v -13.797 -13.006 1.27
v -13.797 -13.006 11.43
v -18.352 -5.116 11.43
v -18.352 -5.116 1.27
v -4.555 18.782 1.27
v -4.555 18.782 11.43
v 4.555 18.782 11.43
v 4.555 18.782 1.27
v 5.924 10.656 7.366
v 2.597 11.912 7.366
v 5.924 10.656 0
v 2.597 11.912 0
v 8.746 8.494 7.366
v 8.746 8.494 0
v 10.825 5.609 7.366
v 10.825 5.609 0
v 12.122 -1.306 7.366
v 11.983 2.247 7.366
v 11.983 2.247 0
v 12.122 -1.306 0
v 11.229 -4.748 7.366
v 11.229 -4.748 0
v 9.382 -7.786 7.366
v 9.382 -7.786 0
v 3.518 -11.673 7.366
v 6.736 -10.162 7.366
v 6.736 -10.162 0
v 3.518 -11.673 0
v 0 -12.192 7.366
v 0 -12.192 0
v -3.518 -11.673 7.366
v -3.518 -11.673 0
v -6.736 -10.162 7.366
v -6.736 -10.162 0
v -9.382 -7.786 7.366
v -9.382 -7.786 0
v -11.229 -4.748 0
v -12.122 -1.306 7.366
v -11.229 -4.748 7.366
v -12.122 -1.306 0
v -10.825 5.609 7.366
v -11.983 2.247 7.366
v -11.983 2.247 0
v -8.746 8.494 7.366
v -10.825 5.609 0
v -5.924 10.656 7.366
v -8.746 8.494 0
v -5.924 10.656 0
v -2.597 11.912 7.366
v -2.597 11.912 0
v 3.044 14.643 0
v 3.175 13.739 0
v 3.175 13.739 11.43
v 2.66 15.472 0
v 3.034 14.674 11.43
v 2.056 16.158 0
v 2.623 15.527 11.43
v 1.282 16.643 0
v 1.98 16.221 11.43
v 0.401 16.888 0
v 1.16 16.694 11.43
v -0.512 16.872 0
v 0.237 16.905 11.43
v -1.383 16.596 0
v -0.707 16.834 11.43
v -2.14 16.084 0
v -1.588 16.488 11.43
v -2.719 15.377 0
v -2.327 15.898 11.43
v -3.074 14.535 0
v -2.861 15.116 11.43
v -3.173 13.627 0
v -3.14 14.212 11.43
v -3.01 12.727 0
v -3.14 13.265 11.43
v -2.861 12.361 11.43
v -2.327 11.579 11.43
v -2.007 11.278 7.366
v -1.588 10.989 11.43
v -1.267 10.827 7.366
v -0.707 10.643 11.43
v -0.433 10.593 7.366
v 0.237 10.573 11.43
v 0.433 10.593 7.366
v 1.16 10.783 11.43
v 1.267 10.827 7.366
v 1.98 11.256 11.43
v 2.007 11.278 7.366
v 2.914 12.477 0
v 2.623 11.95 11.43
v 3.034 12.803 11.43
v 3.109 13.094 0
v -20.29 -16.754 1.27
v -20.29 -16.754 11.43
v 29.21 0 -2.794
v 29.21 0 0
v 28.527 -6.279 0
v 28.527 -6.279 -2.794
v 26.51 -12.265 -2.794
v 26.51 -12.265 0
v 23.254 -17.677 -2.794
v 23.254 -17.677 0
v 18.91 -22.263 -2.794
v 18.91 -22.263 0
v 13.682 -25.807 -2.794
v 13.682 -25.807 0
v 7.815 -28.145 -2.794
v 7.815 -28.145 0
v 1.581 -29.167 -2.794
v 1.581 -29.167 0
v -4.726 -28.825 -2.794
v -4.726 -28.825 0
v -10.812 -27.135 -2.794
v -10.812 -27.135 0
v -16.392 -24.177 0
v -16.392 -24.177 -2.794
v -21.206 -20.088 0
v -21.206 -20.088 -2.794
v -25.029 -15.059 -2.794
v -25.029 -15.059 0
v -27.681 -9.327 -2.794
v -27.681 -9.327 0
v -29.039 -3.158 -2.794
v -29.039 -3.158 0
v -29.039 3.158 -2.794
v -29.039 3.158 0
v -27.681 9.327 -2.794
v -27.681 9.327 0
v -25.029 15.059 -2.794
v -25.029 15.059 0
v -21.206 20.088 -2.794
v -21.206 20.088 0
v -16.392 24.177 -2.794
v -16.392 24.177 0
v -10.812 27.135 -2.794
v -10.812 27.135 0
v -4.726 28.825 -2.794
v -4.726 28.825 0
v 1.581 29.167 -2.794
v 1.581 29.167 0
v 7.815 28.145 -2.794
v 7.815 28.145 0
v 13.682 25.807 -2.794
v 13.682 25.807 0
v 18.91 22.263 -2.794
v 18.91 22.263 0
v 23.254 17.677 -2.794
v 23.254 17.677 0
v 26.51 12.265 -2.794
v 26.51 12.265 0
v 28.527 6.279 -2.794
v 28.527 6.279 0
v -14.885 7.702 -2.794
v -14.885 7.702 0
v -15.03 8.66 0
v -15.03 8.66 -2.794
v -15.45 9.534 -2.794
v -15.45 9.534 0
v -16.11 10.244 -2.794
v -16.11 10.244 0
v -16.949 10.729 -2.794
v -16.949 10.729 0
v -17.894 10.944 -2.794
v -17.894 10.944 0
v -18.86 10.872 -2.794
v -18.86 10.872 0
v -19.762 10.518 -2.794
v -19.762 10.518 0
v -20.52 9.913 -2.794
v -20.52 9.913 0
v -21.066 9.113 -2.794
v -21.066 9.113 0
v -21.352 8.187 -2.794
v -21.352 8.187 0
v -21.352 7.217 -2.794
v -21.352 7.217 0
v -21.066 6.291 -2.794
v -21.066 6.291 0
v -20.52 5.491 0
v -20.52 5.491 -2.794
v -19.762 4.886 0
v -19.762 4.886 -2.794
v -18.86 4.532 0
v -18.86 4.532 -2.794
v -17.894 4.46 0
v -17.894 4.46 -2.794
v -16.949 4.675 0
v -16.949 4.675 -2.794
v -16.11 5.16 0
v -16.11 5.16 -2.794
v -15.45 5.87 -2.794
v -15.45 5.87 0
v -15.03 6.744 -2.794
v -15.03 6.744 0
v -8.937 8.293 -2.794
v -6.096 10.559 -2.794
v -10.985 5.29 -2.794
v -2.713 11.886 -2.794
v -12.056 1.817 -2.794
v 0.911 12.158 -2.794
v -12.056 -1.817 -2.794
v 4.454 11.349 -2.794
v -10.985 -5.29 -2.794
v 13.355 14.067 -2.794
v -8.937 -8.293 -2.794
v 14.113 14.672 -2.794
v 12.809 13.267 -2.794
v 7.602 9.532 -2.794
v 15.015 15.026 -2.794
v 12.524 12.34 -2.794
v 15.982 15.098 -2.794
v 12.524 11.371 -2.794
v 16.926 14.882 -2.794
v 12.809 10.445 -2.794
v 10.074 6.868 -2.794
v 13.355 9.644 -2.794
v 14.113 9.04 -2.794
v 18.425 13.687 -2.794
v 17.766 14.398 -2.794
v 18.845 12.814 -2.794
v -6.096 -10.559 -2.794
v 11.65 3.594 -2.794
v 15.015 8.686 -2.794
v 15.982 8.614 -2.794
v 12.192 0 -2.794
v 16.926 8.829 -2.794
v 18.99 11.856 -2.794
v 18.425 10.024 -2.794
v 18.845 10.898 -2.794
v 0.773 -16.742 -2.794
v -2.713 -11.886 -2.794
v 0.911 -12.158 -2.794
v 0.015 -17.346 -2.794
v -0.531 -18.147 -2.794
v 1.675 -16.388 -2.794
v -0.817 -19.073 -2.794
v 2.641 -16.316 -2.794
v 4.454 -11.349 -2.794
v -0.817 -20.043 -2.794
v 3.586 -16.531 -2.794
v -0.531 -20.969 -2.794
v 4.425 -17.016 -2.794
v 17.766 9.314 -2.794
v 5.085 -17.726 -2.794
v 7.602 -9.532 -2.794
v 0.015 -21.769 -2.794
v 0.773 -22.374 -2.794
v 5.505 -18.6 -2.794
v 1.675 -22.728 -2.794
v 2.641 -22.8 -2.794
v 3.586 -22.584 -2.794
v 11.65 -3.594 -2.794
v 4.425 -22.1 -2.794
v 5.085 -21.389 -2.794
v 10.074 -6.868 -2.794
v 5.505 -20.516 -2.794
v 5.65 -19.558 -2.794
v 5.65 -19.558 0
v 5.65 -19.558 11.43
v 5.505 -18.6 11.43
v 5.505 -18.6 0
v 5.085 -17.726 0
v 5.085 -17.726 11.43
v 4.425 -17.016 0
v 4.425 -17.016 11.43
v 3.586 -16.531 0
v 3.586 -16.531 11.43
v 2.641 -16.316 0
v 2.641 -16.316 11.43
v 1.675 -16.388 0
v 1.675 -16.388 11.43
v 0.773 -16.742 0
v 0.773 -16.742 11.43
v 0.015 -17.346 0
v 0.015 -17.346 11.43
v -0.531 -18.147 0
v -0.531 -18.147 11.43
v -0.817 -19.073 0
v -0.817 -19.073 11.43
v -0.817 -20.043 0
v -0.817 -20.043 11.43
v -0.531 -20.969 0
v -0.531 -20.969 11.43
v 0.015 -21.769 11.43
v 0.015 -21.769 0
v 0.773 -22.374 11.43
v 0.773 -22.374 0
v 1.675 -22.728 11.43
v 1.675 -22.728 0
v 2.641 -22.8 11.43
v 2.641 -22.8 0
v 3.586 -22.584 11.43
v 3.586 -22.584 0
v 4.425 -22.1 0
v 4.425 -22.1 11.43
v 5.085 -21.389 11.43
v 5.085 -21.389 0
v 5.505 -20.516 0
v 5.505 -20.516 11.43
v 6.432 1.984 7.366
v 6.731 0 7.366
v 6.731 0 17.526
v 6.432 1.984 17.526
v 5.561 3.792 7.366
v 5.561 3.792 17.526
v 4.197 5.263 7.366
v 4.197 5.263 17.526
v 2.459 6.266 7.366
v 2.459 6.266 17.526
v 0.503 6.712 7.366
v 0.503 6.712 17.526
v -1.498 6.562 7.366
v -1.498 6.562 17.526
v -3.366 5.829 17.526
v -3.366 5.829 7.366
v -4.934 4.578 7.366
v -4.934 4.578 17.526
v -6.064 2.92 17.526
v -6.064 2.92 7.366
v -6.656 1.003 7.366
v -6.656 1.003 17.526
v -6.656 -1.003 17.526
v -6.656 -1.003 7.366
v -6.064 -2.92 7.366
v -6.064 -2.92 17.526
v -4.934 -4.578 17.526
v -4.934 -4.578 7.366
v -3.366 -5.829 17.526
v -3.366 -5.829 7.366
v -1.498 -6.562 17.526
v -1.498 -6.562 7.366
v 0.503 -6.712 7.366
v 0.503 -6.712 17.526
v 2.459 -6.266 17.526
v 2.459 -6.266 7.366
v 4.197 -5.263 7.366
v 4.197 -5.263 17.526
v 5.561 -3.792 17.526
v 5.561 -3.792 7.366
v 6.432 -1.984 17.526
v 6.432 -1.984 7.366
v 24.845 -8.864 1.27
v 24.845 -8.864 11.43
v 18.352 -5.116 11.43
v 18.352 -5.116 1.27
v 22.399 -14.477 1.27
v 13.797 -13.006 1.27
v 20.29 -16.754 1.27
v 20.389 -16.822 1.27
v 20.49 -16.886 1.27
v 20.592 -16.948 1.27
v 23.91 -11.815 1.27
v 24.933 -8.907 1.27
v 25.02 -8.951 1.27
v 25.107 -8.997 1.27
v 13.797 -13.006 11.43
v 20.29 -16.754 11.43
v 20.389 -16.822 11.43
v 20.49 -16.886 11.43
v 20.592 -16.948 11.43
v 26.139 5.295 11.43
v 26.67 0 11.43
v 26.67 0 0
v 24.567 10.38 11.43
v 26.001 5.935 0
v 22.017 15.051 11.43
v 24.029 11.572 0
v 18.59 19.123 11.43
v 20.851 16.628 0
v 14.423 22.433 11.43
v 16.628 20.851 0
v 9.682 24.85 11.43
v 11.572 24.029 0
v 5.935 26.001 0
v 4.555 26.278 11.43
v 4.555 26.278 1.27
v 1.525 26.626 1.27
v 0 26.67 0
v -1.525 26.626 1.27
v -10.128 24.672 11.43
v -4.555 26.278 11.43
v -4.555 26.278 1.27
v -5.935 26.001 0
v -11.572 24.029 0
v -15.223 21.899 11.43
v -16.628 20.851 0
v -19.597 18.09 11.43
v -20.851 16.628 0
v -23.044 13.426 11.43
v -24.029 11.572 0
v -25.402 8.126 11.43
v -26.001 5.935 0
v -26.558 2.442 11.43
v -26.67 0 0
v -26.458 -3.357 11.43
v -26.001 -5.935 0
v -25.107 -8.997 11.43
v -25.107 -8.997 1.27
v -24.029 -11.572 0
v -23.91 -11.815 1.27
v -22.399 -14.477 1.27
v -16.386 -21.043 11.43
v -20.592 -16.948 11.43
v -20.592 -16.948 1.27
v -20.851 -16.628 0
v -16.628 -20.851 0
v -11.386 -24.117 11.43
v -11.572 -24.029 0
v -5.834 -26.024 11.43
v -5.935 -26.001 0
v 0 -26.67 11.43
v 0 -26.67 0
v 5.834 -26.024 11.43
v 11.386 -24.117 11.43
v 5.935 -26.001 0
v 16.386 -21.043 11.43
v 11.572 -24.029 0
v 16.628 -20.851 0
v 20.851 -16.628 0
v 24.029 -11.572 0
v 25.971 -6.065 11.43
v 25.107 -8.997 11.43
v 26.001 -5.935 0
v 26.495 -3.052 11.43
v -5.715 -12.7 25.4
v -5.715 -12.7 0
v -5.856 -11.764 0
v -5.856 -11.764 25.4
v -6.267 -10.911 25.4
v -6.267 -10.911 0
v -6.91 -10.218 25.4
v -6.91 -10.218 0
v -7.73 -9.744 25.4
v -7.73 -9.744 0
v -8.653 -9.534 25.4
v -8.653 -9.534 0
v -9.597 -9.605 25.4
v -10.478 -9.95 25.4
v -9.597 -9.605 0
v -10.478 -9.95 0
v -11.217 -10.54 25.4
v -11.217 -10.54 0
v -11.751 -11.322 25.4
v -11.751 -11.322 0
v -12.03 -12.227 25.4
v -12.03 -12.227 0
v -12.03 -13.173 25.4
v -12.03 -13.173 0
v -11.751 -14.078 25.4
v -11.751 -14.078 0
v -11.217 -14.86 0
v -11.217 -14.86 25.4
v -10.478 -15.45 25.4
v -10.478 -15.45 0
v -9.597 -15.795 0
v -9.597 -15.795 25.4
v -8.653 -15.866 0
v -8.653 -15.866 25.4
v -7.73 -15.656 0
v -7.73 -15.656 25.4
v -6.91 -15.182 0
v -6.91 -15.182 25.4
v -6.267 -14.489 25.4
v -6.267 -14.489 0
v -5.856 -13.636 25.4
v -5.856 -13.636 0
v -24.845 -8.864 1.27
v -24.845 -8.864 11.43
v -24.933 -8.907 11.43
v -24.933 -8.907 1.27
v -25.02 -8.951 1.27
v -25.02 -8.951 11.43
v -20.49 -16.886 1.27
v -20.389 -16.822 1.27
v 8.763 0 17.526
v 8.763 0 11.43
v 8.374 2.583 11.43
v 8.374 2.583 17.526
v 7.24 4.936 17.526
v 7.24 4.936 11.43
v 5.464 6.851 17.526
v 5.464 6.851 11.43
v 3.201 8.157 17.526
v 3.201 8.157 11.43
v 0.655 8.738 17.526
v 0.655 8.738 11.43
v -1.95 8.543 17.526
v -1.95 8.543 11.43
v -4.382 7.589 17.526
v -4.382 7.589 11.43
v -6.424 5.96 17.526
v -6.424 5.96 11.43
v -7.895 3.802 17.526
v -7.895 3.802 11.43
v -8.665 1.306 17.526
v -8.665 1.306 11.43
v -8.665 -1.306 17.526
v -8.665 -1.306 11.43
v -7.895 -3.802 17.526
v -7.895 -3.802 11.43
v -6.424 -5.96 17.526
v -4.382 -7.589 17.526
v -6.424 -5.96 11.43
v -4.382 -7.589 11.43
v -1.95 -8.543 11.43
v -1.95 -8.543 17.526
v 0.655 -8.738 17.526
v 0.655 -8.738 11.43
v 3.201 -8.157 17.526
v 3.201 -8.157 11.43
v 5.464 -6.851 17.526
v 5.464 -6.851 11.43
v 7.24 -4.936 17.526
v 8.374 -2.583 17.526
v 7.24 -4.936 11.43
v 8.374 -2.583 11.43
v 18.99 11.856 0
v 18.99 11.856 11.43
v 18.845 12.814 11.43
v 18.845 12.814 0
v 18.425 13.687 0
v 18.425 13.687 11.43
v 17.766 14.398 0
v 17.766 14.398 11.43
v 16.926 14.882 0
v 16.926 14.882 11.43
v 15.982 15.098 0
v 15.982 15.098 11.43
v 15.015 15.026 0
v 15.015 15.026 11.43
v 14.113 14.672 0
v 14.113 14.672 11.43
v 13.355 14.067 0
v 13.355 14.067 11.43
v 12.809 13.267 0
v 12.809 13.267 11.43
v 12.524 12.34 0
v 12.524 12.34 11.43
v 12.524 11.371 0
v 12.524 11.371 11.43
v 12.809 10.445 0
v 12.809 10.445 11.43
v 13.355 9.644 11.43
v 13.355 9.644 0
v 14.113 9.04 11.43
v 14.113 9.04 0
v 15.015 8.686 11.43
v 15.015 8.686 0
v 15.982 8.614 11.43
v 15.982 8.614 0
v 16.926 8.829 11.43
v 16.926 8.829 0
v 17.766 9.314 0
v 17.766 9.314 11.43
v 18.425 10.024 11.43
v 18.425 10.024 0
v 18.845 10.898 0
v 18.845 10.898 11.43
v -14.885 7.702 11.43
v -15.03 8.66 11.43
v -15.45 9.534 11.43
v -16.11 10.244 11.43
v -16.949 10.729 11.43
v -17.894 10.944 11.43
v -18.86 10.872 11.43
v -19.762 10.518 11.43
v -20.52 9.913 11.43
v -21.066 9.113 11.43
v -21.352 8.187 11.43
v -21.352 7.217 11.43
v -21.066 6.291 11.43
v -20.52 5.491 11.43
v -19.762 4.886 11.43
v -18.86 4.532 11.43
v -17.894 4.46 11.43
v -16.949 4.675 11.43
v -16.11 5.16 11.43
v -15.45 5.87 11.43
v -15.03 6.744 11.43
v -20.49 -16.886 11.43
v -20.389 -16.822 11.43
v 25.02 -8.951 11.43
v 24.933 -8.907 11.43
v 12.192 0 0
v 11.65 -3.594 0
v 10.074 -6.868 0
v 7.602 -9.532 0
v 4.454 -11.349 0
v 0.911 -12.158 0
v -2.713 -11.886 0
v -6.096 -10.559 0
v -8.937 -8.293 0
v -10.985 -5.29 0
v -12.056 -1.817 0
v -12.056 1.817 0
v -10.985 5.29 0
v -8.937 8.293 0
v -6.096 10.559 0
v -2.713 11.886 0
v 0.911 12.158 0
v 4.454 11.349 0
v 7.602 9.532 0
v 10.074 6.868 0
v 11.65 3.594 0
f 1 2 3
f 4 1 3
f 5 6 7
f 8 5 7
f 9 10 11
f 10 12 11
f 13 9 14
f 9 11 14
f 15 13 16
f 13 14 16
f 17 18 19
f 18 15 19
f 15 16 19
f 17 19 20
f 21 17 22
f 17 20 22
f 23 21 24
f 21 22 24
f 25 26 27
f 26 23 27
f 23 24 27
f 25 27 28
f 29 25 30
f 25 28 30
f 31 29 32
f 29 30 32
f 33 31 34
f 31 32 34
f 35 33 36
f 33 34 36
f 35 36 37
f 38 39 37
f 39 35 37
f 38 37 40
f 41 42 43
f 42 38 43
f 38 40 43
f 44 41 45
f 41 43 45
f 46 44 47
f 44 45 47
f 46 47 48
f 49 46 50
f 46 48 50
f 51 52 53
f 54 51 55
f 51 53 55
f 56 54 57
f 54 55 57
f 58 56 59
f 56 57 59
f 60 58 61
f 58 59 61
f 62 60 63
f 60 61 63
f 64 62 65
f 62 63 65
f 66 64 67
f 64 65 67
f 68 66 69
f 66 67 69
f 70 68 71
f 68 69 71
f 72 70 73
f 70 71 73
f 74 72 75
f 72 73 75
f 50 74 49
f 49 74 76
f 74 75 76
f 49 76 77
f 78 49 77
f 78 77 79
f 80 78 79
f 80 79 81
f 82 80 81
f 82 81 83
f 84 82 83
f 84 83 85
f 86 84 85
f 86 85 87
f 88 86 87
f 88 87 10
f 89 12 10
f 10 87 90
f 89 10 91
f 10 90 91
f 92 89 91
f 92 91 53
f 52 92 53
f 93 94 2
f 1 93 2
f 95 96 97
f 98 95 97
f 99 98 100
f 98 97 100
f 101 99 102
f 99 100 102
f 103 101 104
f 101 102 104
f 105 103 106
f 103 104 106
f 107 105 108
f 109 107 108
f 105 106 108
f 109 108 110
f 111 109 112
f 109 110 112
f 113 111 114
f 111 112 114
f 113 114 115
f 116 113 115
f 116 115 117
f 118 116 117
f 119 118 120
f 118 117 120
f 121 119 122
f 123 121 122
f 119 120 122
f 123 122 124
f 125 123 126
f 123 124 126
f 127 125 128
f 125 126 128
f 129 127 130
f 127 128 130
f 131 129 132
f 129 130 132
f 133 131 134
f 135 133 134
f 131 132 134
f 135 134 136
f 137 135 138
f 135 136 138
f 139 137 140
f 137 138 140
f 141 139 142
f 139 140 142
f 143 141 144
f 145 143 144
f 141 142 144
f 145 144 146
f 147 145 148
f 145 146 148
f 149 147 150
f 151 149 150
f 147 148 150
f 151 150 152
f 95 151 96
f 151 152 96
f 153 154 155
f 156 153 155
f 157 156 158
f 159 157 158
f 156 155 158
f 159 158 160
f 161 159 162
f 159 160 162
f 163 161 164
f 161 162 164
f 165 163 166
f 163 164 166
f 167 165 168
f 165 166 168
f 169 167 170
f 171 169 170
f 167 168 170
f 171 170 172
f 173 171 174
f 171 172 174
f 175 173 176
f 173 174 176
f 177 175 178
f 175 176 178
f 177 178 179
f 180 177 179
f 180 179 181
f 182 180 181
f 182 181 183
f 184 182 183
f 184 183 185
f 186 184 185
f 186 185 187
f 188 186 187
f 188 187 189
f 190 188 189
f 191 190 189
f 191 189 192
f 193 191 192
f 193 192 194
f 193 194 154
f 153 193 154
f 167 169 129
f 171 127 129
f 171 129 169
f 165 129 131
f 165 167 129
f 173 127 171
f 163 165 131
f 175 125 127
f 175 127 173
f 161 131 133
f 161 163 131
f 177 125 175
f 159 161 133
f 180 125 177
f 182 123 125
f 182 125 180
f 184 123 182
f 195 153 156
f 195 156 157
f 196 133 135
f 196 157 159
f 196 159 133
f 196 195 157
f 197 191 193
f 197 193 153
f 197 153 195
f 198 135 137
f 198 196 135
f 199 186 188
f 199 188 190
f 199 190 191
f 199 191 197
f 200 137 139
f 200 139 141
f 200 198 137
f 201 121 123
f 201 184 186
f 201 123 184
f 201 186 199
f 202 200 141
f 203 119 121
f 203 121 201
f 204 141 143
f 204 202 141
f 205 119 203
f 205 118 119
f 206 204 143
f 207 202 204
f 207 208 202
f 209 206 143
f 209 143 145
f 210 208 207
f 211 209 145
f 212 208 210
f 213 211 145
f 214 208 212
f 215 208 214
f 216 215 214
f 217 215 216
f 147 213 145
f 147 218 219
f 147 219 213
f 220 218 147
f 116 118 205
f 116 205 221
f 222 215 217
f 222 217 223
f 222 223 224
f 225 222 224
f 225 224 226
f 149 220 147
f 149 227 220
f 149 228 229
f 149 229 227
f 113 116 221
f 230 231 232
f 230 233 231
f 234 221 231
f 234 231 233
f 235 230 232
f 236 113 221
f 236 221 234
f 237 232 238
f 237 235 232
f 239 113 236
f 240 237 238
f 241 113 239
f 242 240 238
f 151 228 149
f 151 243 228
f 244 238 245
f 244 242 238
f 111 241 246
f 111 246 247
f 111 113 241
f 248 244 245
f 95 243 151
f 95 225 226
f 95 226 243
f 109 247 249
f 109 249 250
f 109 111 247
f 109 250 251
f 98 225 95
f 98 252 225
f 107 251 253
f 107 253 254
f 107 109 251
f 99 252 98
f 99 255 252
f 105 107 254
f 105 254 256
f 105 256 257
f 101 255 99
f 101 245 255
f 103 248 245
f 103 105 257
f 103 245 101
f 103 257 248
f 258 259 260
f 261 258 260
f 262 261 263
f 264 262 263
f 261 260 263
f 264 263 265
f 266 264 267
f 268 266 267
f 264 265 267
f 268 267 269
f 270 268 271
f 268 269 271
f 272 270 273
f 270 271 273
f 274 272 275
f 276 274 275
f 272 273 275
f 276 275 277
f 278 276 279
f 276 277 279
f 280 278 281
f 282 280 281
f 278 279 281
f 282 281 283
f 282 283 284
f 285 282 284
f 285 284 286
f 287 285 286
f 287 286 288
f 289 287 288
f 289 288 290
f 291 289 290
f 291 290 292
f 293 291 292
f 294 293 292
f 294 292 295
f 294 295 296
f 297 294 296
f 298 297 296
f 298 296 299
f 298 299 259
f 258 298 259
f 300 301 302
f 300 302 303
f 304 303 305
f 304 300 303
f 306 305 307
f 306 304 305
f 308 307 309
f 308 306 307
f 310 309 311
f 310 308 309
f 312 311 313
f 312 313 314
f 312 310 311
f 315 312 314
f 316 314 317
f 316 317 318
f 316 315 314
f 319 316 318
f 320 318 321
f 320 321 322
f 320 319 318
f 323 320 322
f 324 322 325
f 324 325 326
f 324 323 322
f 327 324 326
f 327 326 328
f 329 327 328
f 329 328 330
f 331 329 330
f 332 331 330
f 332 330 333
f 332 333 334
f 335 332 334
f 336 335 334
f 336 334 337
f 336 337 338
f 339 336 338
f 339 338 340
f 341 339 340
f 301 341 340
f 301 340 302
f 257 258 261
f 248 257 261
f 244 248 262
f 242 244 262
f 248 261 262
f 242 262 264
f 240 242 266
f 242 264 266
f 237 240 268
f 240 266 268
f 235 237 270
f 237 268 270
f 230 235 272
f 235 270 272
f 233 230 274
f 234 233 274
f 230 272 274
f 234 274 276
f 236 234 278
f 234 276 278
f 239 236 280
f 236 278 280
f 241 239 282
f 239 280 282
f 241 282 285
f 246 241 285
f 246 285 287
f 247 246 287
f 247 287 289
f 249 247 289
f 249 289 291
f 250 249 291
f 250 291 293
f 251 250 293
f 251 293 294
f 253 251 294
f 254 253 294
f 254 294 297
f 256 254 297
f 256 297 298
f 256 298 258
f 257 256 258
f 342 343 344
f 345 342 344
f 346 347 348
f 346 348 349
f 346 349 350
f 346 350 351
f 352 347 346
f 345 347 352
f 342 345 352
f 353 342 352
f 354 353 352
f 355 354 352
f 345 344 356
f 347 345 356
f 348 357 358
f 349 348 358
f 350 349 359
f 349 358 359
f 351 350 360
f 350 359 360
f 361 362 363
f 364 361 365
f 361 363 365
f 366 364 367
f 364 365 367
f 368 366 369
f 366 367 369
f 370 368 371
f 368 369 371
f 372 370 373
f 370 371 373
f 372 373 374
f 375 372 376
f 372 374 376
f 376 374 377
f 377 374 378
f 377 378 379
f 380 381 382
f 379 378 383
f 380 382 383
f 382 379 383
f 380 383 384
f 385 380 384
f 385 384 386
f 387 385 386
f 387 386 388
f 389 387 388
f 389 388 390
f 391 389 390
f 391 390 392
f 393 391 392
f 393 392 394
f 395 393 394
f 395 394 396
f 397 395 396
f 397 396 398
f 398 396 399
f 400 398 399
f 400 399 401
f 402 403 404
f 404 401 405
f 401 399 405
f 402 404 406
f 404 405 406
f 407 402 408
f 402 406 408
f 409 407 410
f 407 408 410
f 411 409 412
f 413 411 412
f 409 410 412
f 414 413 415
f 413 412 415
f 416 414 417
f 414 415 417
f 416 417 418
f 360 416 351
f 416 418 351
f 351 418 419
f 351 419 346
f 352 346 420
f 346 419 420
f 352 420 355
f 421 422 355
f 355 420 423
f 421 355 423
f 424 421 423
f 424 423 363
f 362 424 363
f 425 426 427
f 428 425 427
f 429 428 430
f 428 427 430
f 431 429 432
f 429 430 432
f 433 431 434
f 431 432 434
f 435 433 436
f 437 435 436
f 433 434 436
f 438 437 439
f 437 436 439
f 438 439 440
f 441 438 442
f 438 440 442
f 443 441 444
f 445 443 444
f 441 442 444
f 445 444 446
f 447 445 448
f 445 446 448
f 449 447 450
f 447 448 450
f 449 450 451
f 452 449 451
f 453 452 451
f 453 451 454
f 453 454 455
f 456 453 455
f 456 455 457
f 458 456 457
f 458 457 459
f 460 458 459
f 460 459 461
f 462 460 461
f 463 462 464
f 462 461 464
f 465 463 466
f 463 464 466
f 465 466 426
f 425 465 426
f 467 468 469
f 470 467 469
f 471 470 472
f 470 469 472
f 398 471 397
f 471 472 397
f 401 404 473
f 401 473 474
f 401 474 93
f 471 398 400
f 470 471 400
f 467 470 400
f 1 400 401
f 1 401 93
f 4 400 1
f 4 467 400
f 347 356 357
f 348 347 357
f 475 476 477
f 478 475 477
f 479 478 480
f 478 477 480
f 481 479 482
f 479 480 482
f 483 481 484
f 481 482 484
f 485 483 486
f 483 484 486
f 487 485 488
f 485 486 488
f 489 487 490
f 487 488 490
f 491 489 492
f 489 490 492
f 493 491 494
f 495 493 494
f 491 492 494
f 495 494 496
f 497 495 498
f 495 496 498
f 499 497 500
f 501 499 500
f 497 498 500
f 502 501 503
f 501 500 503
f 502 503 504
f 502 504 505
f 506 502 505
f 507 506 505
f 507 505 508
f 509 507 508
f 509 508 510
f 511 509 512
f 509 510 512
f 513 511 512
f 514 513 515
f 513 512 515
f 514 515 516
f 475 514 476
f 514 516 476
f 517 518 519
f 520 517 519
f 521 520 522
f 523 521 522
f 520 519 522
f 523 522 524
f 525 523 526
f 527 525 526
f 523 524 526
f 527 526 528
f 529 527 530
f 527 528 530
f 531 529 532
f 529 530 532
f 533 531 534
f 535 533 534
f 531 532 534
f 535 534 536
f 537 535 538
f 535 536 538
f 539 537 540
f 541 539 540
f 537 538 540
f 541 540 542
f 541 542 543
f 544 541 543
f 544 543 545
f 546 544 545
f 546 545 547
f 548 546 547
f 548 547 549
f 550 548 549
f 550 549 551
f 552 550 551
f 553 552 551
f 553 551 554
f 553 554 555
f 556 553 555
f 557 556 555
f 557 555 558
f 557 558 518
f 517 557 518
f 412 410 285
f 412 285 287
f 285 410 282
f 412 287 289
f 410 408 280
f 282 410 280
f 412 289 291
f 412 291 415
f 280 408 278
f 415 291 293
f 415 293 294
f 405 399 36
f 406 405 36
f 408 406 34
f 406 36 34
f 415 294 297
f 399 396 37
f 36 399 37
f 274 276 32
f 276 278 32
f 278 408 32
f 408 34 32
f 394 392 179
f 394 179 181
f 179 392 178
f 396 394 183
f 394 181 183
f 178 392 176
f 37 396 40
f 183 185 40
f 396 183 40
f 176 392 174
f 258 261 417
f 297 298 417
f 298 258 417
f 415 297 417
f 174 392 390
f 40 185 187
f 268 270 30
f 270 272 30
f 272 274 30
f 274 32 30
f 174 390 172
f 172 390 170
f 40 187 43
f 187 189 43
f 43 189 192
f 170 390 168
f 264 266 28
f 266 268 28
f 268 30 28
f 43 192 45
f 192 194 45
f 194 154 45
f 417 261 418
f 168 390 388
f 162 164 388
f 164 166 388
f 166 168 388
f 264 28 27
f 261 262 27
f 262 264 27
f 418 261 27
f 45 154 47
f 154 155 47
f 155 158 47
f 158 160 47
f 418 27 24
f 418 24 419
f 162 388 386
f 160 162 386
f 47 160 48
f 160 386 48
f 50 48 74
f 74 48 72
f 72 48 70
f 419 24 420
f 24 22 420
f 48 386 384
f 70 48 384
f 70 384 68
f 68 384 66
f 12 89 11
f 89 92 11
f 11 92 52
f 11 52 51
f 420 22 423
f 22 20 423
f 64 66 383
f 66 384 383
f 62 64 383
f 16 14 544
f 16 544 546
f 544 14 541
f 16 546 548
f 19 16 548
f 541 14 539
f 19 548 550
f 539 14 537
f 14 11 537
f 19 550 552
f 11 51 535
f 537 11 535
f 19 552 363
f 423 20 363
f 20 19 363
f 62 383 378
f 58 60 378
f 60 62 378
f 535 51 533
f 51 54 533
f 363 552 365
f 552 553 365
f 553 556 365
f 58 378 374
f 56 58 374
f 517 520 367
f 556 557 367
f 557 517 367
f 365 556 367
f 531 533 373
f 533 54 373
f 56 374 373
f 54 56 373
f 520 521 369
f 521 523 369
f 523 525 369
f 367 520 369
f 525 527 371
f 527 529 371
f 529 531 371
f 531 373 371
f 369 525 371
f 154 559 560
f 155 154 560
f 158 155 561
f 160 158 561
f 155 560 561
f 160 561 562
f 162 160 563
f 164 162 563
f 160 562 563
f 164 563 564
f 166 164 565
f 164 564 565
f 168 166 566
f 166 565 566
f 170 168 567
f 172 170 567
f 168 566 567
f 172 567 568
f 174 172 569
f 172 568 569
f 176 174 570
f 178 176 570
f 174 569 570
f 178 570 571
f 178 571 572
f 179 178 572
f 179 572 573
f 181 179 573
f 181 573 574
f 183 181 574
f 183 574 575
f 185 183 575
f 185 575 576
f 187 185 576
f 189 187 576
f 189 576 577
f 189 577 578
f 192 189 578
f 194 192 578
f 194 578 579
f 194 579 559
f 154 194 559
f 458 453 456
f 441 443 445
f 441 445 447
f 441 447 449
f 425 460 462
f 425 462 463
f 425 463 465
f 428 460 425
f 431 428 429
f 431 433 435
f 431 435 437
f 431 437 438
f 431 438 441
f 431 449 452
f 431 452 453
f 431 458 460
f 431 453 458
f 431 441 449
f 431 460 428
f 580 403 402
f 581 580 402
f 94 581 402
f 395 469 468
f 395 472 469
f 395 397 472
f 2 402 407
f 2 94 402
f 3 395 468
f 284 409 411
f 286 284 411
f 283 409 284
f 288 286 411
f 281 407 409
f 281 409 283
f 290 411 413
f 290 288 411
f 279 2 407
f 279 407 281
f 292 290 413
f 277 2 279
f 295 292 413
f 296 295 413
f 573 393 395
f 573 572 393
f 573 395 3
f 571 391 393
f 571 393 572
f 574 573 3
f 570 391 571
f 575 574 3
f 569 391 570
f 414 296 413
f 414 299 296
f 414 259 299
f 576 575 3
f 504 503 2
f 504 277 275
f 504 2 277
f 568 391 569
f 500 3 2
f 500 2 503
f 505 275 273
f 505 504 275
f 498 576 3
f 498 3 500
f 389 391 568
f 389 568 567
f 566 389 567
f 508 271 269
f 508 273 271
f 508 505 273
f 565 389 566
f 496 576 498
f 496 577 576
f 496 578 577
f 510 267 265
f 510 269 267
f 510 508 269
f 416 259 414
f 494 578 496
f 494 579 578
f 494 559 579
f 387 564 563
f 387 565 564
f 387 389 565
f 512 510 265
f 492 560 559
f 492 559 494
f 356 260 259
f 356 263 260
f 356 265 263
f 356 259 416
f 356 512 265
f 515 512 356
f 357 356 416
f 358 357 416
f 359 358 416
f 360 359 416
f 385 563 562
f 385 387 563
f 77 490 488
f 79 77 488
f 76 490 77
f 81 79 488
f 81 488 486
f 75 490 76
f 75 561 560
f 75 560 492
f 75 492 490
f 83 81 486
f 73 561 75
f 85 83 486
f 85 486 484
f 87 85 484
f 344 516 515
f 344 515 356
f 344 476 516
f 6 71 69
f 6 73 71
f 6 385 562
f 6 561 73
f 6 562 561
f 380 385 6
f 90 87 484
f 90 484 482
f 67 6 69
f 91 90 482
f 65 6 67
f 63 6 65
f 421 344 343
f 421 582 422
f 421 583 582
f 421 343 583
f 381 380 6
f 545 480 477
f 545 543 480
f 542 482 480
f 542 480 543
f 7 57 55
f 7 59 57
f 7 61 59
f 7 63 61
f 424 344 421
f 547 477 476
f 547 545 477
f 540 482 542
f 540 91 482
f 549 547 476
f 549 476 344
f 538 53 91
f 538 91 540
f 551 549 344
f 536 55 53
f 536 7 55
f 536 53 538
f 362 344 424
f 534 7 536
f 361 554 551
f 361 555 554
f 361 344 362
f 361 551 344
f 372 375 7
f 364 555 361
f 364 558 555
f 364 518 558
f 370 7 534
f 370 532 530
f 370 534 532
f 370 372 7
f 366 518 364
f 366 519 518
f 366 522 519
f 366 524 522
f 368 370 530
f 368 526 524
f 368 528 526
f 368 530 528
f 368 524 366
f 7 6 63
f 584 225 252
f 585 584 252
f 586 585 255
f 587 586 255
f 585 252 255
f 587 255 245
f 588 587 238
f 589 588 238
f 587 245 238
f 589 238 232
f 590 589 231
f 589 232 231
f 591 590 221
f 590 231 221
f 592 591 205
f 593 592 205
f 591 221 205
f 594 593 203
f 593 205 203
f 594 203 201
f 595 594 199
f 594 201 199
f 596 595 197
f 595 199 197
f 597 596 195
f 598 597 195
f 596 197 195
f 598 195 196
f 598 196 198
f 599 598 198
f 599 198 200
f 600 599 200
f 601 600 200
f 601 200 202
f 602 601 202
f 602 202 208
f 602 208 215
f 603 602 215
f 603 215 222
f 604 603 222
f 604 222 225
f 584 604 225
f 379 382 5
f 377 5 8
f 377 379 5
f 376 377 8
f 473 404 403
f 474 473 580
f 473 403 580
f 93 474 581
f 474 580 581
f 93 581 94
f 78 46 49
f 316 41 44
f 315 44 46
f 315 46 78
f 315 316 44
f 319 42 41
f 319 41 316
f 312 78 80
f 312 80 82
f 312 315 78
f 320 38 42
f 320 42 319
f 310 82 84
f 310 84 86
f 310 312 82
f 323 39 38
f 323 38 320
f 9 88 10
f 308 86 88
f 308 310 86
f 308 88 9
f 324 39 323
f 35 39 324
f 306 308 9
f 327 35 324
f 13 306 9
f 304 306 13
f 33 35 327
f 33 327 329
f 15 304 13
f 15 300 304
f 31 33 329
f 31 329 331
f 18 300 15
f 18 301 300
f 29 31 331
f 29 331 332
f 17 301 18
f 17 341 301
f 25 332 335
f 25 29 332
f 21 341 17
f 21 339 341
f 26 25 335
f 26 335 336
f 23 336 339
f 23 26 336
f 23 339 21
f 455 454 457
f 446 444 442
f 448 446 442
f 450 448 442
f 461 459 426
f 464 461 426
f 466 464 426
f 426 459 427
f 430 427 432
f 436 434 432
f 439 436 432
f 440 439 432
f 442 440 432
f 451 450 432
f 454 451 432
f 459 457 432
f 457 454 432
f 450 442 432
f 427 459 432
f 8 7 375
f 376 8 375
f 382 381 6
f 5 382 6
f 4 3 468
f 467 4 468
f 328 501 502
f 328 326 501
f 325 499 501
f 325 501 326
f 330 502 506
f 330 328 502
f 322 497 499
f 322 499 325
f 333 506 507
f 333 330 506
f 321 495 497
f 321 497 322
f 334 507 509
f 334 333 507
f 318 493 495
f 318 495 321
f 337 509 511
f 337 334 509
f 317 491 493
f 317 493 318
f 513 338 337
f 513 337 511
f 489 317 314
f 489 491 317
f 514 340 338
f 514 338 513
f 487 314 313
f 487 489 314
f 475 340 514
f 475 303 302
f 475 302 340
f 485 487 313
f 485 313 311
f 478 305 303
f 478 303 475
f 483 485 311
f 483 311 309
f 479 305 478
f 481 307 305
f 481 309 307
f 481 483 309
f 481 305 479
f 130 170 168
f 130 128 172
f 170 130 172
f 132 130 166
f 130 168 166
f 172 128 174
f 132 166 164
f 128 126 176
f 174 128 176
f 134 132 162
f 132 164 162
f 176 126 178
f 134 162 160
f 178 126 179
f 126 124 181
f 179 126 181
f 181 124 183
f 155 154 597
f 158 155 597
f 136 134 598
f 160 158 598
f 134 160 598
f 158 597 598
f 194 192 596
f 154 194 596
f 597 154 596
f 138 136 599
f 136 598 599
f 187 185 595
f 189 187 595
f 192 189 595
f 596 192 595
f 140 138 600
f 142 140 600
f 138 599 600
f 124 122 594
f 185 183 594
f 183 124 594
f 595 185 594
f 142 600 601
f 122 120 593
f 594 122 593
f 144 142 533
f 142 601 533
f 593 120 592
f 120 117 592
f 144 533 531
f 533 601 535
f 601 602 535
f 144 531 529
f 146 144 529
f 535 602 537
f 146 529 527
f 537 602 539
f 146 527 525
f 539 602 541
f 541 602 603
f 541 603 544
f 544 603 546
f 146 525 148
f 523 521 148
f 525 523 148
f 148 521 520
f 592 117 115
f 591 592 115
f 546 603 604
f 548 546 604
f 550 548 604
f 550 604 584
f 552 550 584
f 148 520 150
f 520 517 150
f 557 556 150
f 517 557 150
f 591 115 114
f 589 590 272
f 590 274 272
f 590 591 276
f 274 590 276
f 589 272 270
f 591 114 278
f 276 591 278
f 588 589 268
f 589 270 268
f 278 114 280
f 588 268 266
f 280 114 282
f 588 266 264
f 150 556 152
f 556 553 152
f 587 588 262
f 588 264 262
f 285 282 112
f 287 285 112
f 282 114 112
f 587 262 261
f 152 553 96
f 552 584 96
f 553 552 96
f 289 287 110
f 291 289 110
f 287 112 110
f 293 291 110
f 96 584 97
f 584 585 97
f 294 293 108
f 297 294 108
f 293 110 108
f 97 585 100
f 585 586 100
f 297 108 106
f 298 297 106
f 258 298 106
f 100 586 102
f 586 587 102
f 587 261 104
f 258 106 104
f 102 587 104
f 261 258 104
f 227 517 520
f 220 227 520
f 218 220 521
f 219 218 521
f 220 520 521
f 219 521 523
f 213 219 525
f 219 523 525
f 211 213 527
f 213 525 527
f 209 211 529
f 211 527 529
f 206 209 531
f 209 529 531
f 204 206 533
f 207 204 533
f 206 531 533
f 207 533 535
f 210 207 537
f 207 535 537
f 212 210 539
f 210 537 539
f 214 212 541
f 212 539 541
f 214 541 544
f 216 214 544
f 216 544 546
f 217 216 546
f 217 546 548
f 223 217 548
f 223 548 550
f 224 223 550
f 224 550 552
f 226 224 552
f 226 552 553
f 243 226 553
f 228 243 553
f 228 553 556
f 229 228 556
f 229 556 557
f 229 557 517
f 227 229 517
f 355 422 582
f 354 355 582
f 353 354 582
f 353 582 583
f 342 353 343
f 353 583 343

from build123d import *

# Parameters (mm, degrees)
F0_R         = 26.67
F1_DEPTH     = 11.43
F2_R         = 8.763
F2_R_2       = 6.731
F3_DEPTH     = 6.096
F4_R         = 29.21
F4_R_2       = 26.67
F5_DEPTH     = 2.794
F6_R         = 6.731
F7_DEPTH     = 25.4
F8_R         = 12.192
F9_DEPTH     = 10.16
F11_DEPTH    = 10.16
F12_R        = 3.2513011885
F13_DEPTH    = 25.4
F14_R        = 3.175
F15_DEPTH    = 25.4
F16_R        = 3.175
F5_FACE1_R   = 29.21
F5_FACE1_R_2 = 3.2513011885
F5_FACE1_R_3 = 12.192
F5_FACE_R    = 29.21
F5_FACE_R_2  = 3.2513011885
F5_FACE_R_3  = 12.192
F17_DEPTH    = 50.8


with BuildPart() as f1:
    # F0 (on Top) → F1 (new body)
    with BuildSketch(Plane.XY):
        Circle(F0_R)
    extrude(amount=F1_DEPTH)

    # F2 (on face) → F3 (join)
    with BuildSketch(Plane.XY.offset(11.43)):
        Circle(F2_R)
        Circle(F2_R_2, mode=Mode.SUBTRACT)
    extrude(amount=F3_DEPTH)

    # F6 (on Top) → F7 (cut)
    with BuildSketch(Plane.XY):
        Circle(F6_R)
    extrude(amount=F7_DEPTH, mode=Mode.SUBTRACT)


with BuildPart() as f5:
    # F4 (on face) → F5 (new body)
    with BuildSketch(Plane(origin=(0, 0, 0), x_dir=(1, 0, 0), z_dir=(0, 0, -1))):
        Circle(F4_R)
        Circle(F4_R_2, mode=Mode.SUBTRACT)
        Circle(F4_R_2)
    extrude(amount=F5_DEPTH)


with BuildPart() as f9_tool:
    # F8 (on face) → F9 (new body)
    with BuildSketch(Plane(origin=(0, 0, -2.794), x_dir=(1, 0, 0), z_dir=(0, 0, -1))):
        Circle(F8_R)
    extrude(amount=-F9_DEPTH)


with BuildPart() as f1_1:
    add(f1.part)

    # F9: cut by f9_tool
    add(f9_tool.part, mode=Mode.SUBTRACT)

    # F10 (on face) → F11 (cut)
    with BuildSketch(Plane.XY.offset(11.43)):
        with BuildLine():
            Line((4.555173936, 18.7815254891), (4.555173936, 26.2781142857))
            ThreePointArc((4.555173936, 26.2781142857), (0, 31.242), (-4.555173936, 26.2781142857))
            Line((-4.555173936, 26.2781142857), (-4.555173936, 18.7815254891))
            Line((-4.555173936, 18.7815254891), (4.555173936, 18.7815254891))
        make_face()
        with BuildLine():
            ThreePointArc((-24.8446906591, -8.8643595398), (-26.8659548212, -15.2911987441), (-20.2895167231, -16.7541522342))
            Line((-20.2895167231, -16.7541522342), (-13.7972803835, -13.0058578359))
            Line((-13.7972803835, -13.0058578359), (-18.3524543195, -5.1160651415))
            Line((-18.3524543195, -5.1160651415), (-24.8446906591, -8.8643595398))
        make_face()
        with BuildLine():
            ThreePointArc((20.2895167231, -16.7541522342), (26.8659548212, -15.2911987441), (24.8446906591, -8.8643595398))
            Line((24.8446906591, -8.8643595398), (18.3524543195, -5.1160651415))
            Line((18.3524543195, -5.1160651415), (13.7972803835, -13.0058578359))
            Line((13.7972803835, -13.0058578359), (20.2895167231, -16.7541522342))
        make_face()
    extrude(amount=-F11_DEPTH, mode=Mode.SUBTRACT)


with BuildPart() as f5_1:
    add(f5.part)

    # F9: cut by f9_tool
    add(f9_tool.part, mode=Mode.SUBTRACT)


with BuildPart() as f13_tool:
    # F12 (on face) → F13 (new body)
    with BuildSketch(Plane.XY.offset(11.43)):
        with Locations((15.7385375351, 11.855901219)):
            Circle(F12_R)
        with Locations((-18.1367804079, 7.7020227143)):
            Circle(F12_R)
        with Locations((2.3982428728, -19.5579239333)):
            Circle(F12_R)
    extrude(amount=-F13_DEPTH)


with BuildPart() as f1_2:
    add(f1_1.part)

    # F13: cut by f13_tool
    add(f13_tool.part, mode=Mode.SUBTRACT)

    # F16 (on face) + F5_face1 (on face) + F5_face (on face) → F17 (cut)
    with BuildSketch(Plane.XY.offset(11.43)):
        with Locations((0, 13.7386375334)):
            Circle(F16_R)
    with BuildSketch(Plane.XY):
        Circle(F5_FACE1_R)
        with Locations((-18.1367804079, 7.7020227143)):
            Circle(F5_FACE1_R_2, mode=Mode.SUBTRACT)
        with Locations((15.7385375351, 11.855901219)):
            Circle(F5_FACE1_R_2, mode=Mode.SUBTRACT)
        Circle(F5_FACE1_R_3, mode=Mode.SUBTRACT)
        with Locations((2.3982428728, -19.5579239333)):
            Circle(F5_FACE1_R_2, mode=Mode.SUBTRACT)
    with BuildSketch(Plane(origin=(0, 0, -2.794), x_dir=(1, 0, 0), z_dir=(0, 0, -1))):
        Circle(F5_FACE_R)
        with Locations((-18.1367804079, -7.7020227143)):
            Circle(F5_FACE_R_2, mode=Mode.SUBTRACT)
        with Locations((15.7385375351, -11.855901219)):
            Circle(F5_FACE_R_2, mode=Mode.SUBTRACT)
        Circle(F5_FACE_R_3, mode=Mode.SUBTRACT)
        with Locations((2.3982428728, 19.5579239333)):
            Circle(F5_FACE_R_2, mode=Mode.SUBTRACT)
    extrude(amount=-F17_DEPTH, dir=(0, 0, 1), mode=Mode.SUBTRACT)


with BuildPart() as f5_2:
    add(f5_1.part)

    # F13: cut by f13_tool
    add(f13_tool.part, mode=Mode.SUBTRACT)


with BuildPart() as f15:
    # F14 (on Top) → F15 (new body)
    with BuildSketch(Plane.XY):
        with Locations((-8.89, -12.7)):
            Circle(F14_R)
    extrude(amount=F15_DEPTH)


solid = Compound([f1_2.part, f5_2.part, f15.part])
